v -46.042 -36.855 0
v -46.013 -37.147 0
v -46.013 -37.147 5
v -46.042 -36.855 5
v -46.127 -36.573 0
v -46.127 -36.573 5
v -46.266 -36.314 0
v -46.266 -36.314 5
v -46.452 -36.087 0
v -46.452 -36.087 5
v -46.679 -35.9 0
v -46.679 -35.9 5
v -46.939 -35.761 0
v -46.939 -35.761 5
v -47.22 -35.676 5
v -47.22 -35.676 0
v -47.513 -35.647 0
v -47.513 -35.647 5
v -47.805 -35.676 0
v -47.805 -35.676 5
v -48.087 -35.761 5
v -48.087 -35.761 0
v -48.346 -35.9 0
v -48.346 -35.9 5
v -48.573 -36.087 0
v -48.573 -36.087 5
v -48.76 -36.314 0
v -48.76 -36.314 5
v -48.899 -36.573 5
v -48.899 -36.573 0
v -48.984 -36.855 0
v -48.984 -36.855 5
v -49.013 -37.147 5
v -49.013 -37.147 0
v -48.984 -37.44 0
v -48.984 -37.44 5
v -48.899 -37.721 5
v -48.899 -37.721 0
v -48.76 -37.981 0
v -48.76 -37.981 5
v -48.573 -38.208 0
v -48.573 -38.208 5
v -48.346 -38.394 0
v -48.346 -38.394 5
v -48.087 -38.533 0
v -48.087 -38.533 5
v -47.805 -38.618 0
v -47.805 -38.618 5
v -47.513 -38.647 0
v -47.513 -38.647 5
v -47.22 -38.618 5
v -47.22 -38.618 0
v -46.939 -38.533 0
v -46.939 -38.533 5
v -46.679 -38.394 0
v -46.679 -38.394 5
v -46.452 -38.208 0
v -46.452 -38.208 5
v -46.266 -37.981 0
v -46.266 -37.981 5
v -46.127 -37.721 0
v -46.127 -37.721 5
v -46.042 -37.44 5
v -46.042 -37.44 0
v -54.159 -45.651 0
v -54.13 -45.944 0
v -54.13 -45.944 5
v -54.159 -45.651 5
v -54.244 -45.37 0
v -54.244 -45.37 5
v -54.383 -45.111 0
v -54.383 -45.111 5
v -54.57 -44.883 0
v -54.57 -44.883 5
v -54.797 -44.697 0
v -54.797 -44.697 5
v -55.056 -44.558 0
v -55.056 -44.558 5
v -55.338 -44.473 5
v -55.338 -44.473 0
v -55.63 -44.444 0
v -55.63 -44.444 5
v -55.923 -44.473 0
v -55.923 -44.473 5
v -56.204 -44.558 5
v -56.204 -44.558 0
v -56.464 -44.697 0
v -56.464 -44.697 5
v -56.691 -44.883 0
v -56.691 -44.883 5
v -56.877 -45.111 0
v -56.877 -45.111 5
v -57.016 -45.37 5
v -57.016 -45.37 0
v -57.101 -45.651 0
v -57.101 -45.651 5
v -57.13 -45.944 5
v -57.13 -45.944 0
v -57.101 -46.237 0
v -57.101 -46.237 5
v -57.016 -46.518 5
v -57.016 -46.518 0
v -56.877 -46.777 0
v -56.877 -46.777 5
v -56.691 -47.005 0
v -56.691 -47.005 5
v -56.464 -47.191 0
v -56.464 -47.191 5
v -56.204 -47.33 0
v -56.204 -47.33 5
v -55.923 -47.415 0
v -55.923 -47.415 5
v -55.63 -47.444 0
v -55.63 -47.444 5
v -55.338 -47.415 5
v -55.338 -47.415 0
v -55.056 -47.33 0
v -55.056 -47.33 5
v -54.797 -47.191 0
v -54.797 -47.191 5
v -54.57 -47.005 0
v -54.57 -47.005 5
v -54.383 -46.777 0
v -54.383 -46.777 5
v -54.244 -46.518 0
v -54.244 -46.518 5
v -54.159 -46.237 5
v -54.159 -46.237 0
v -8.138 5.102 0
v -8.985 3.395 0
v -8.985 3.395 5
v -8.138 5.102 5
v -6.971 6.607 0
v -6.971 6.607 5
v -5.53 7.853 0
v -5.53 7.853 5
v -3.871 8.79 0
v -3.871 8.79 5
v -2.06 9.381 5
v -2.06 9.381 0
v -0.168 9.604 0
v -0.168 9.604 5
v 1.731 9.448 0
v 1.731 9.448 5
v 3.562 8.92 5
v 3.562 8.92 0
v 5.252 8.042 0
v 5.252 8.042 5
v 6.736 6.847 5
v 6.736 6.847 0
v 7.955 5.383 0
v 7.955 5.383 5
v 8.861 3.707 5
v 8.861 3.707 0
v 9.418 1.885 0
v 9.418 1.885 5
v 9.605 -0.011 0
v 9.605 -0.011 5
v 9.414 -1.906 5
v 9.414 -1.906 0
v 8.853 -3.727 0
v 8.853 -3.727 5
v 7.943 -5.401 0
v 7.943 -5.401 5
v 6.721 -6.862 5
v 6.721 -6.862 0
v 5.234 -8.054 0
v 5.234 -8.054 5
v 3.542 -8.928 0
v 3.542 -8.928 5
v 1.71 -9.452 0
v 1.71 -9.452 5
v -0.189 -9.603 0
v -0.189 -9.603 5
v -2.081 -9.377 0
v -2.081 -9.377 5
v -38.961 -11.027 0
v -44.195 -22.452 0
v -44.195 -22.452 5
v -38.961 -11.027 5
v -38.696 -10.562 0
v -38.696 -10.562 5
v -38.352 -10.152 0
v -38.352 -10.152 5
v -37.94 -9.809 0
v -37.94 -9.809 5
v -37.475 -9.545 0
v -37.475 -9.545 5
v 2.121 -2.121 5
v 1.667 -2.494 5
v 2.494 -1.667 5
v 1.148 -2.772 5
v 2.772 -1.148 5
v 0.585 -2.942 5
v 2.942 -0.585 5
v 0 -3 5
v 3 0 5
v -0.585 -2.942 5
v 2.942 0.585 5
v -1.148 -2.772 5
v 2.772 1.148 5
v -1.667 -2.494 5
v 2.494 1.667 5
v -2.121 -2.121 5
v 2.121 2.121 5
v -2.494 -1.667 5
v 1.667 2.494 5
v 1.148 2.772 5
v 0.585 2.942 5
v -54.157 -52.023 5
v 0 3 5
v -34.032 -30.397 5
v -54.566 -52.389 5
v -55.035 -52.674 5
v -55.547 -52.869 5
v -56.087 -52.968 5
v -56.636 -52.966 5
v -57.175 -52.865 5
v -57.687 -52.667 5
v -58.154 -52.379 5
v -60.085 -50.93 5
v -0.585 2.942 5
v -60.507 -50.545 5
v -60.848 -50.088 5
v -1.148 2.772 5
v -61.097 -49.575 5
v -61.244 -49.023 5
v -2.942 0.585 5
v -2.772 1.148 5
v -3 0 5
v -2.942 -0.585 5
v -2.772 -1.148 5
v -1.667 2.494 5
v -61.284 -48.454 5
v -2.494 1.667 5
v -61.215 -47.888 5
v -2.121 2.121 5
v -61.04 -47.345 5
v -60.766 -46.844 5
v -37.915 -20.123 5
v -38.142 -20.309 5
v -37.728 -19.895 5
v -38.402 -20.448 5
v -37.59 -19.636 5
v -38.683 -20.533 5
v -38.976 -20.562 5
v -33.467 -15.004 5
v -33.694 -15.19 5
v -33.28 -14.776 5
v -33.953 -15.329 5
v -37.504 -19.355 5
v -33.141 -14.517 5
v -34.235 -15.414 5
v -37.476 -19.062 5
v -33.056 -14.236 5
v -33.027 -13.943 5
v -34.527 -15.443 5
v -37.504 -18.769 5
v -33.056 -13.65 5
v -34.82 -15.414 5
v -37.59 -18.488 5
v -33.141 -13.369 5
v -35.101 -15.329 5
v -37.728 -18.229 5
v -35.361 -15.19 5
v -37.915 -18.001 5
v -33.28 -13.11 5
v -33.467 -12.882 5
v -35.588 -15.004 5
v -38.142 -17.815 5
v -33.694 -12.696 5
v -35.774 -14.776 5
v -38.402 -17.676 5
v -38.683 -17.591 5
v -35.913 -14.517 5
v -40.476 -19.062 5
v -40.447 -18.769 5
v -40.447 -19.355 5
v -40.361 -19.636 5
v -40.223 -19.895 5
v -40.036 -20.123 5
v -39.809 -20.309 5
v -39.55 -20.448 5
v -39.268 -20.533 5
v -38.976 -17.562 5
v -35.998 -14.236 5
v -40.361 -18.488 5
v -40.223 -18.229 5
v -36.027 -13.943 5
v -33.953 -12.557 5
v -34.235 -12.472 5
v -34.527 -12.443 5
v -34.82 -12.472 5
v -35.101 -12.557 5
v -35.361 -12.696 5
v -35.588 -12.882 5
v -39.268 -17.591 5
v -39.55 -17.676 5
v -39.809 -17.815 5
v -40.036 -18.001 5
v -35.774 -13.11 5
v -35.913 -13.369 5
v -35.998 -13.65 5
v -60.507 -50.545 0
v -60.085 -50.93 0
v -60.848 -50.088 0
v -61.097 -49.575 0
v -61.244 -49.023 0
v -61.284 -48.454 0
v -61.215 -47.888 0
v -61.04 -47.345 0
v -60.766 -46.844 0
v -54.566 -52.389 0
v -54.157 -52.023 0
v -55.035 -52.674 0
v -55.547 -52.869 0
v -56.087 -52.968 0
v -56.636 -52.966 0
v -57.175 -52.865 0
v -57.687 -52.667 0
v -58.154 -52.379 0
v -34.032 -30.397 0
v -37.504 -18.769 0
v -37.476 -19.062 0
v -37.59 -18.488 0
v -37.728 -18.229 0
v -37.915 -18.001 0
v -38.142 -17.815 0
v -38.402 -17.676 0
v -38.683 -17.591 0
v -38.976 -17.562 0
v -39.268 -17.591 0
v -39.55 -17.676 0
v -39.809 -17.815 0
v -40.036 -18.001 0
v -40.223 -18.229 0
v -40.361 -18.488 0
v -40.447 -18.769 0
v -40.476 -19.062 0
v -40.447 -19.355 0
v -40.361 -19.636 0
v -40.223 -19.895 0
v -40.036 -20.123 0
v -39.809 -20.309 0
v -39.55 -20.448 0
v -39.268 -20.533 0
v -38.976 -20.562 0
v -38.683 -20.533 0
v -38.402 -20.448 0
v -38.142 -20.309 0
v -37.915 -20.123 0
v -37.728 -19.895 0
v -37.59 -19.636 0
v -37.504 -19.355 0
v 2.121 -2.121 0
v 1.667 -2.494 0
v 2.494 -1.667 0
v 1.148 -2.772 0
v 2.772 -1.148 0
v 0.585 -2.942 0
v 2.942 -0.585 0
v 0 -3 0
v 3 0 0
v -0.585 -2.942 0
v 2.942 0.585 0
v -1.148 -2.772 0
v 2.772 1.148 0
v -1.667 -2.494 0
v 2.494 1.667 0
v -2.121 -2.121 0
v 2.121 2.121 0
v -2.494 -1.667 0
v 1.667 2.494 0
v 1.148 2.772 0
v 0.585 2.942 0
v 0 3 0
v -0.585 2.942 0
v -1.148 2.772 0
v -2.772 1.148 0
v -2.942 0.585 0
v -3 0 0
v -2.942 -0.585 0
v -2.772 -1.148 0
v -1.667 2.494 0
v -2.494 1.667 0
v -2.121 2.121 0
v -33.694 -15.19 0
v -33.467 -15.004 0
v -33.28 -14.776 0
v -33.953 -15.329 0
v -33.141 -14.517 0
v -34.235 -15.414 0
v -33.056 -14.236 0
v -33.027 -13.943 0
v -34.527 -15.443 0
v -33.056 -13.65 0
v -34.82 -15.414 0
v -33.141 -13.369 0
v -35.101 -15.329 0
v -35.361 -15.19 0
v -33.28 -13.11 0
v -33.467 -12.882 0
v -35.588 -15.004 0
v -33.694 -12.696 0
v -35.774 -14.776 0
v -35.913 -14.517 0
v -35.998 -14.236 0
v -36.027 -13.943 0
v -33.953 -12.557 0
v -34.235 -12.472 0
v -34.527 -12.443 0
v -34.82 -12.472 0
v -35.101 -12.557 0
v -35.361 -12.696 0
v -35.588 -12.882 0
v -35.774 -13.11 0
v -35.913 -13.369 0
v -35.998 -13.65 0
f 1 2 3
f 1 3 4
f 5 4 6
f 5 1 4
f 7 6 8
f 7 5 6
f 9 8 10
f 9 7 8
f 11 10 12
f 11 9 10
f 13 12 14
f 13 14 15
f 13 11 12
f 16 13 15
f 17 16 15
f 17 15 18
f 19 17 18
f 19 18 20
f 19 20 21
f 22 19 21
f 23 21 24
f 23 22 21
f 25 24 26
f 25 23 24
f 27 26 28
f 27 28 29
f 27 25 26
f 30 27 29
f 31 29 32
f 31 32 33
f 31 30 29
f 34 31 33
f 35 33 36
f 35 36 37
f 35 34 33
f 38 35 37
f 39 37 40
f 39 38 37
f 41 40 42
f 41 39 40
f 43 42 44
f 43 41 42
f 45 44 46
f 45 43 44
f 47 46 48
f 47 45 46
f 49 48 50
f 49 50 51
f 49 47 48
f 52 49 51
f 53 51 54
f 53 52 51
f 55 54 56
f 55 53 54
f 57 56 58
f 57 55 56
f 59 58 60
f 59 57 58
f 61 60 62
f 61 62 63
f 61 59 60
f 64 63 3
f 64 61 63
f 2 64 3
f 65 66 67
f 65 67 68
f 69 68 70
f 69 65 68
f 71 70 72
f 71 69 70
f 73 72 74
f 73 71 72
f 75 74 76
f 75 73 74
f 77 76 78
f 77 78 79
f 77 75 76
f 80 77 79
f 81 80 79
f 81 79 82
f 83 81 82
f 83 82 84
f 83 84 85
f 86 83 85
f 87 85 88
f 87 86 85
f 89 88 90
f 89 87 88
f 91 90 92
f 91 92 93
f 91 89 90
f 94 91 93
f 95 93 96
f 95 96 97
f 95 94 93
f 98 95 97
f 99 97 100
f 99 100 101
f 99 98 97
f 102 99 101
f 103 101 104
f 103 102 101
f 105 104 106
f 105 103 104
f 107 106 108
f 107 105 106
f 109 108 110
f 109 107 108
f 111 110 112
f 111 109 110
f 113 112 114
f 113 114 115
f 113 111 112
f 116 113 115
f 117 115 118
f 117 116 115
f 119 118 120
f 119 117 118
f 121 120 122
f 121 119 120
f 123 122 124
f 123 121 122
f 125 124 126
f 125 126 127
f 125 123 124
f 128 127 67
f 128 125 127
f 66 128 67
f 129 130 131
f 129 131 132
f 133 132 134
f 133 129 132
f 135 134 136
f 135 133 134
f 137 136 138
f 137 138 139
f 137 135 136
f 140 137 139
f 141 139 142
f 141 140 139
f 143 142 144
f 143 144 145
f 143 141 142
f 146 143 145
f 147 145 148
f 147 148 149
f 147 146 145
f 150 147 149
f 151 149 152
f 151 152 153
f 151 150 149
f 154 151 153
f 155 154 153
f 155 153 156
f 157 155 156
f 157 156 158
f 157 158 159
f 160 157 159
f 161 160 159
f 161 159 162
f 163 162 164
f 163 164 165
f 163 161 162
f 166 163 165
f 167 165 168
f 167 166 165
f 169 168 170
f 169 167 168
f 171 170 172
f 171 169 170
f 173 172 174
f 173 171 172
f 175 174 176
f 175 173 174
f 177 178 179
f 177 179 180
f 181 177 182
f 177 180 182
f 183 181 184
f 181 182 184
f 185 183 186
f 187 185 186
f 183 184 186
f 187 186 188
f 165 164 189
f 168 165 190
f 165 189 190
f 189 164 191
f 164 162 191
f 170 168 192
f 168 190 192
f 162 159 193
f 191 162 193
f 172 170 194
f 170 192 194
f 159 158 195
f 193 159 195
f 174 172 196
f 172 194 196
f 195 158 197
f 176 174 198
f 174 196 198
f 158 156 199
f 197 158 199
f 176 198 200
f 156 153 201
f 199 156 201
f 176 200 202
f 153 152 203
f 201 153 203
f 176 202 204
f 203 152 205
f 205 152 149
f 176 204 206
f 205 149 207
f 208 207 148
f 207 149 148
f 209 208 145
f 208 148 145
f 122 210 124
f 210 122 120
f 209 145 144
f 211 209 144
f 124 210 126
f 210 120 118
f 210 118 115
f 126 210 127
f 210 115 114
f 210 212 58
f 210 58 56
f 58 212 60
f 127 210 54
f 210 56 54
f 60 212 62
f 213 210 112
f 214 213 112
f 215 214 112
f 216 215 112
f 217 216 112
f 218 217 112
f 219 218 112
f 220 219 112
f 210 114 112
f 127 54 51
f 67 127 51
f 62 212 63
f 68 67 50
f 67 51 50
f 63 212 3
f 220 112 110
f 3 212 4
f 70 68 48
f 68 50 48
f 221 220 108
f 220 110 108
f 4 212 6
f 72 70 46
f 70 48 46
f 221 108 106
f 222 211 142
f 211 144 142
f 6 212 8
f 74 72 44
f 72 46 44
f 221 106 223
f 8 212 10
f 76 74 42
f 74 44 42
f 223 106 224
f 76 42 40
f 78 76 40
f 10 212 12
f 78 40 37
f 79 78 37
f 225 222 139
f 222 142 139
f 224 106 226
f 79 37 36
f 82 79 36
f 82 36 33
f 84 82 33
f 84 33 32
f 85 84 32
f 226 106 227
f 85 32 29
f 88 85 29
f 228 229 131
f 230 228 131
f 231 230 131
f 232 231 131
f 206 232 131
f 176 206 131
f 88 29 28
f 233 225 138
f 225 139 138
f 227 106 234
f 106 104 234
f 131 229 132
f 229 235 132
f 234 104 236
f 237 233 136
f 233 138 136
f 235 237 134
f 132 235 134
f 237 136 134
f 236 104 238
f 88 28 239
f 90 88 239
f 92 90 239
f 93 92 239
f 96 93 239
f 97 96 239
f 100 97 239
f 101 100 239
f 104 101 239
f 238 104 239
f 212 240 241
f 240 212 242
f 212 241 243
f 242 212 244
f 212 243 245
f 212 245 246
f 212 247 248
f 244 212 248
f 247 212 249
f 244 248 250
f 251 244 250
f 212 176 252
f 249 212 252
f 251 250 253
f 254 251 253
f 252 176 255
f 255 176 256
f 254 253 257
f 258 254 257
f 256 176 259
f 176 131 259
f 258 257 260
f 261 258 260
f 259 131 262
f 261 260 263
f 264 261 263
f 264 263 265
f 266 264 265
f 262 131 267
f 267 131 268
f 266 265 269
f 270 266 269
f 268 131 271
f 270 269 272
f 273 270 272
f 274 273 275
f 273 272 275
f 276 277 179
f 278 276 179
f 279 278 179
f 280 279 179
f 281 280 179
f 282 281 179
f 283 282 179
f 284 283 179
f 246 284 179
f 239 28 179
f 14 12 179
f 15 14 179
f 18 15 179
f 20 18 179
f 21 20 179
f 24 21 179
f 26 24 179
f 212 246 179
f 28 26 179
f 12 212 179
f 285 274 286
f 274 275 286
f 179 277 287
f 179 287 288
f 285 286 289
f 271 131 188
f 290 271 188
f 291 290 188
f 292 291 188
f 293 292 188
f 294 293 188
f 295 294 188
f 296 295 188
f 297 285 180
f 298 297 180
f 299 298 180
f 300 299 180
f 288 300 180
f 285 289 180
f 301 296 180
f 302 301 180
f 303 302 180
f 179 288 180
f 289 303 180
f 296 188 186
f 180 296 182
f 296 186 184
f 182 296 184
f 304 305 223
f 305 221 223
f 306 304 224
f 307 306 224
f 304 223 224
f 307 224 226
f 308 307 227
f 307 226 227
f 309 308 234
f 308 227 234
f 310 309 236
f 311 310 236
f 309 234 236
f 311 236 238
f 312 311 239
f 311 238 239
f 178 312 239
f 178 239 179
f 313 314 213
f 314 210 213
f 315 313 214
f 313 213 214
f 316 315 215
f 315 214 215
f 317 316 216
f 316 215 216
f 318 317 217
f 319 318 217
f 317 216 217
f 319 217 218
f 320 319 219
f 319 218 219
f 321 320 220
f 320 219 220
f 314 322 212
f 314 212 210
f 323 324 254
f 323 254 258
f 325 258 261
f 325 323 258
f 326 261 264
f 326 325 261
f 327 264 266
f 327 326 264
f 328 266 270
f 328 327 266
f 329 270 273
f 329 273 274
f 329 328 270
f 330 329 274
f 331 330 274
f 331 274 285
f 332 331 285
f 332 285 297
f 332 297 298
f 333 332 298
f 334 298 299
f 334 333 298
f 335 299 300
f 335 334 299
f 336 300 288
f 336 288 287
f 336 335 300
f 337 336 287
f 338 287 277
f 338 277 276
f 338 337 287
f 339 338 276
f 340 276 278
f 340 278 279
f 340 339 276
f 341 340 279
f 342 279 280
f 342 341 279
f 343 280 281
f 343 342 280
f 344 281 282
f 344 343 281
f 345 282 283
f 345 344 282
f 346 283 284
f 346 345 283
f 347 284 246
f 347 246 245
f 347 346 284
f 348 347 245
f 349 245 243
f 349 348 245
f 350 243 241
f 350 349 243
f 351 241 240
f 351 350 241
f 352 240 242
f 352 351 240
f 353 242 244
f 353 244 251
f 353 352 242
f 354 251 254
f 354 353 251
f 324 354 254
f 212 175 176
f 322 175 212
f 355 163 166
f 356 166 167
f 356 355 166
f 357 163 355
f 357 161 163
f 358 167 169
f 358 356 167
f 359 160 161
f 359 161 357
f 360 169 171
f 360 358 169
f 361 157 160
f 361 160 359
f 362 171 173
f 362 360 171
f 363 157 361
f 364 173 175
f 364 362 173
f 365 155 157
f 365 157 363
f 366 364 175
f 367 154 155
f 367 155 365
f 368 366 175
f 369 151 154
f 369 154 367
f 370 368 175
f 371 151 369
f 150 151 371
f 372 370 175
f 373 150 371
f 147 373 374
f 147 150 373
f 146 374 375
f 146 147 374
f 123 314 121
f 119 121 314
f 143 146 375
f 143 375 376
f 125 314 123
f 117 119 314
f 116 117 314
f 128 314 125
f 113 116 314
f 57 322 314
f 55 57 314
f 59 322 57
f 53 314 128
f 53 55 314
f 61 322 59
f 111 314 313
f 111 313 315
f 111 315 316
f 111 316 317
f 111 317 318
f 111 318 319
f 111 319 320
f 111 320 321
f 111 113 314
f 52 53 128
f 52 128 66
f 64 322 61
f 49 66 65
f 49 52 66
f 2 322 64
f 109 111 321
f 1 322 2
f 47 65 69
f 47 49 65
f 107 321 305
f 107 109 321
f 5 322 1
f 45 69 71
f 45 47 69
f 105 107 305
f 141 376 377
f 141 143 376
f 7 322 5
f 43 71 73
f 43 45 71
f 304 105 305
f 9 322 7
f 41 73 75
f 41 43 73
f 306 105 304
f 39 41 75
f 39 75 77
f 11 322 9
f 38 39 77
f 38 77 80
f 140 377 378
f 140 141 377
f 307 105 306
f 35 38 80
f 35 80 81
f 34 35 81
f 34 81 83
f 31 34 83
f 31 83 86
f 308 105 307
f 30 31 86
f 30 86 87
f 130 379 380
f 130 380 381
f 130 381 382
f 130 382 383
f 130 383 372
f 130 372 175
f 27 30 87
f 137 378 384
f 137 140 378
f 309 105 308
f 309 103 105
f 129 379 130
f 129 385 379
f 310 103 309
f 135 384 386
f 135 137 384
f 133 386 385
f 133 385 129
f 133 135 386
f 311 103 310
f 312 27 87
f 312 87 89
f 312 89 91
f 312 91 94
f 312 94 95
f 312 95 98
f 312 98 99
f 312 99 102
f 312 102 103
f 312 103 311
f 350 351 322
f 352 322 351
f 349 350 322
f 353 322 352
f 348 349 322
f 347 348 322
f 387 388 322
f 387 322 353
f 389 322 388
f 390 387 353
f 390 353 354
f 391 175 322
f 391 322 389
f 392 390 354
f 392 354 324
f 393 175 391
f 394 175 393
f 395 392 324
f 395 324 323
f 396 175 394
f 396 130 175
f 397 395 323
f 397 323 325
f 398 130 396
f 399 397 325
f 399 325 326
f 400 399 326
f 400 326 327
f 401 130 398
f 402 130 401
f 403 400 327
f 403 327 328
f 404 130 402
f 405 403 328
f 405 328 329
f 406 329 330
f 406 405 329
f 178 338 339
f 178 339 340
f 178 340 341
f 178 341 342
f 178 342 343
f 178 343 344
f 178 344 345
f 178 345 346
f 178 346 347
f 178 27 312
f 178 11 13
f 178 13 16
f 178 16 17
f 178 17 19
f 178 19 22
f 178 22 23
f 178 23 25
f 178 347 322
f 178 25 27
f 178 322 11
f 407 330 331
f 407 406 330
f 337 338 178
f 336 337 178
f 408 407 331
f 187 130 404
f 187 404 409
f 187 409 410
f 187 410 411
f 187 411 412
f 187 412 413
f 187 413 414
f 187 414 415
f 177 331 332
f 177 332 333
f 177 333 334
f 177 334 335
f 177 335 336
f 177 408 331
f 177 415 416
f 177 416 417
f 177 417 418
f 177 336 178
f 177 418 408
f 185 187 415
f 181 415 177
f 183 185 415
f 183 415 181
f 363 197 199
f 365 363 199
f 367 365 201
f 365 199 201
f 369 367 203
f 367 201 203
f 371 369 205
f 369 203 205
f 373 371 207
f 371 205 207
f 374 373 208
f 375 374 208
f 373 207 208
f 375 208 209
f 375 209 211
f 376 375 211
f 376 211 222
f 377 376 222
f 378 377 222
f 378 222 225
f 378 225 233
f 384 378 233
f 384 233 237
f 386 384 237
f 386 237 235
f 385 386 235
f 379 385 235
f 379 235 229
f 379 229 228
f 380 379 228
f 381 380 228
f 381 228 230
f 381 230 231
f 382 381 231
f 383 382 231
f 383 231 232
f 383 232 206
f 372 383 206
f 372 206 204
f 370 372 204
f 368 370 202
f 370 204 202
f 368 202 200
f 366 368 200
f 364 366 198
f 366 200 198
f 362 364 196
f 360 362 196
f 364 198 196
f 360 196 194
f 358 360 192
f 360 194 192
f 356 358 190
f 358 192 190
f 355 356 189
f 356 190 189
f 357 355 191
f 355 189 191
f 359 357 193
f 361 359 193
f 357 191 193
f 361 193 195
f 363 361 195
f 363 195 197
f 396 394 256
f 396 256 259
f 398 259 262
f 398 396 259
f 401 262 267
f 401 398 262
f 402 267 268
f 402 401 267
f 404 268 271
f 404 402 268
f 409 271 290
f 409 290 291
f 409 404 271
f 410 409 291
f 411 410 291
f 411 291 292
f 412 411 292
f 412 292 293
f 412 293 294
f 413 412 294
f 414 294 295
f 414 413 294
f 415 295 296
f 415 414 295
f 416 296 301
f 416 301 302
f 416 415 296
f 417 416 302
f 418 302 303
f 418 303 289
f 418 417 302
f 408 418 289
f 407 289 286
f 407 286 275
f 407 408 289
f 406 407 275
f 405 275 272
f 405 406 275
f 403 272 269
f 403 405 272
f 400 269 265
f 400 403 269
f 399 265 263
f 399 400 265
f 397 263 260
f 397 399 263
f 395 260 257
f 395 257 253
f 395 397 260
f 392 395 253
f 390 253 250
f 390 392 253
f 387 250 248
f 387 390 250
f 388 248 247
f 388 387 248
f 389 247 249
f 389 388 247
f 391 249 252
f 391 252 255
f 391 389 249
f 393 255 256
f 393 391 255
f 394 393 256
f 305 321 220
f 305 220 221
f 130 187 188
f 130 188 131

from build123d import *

# Parameters (mm, degrees)
SKETCH_1_R          = 1.5
EXTRUDE_1_DEPTH     = 5
FILLET_1_R          = 3
FILLET_2_R          = 3
FILLET_3_R          = 3
SKETCH_4_R          = 3
CUT_EXTRUDE_1_DEPTH = 82.164250349


with BuildPart() as part:
    # 草图1 → 凸台-拉伸1 (new body)
    with BuildSketch(Plane.XY):
        with BuildLine():
            Line((-2.080891717, -9.376881926), (-34.032481316, -30.39709937))
            Line((-34.032481316, -30.39709937), (-55.995404685, -53.998955167))
            Line((-55.995404685, -53.998955167), (-62.374359774, -49.211848164))
            Line((-62.374359774, -49.211848164), (-44.195107683, -22.4521745))
            Line((-44.195107683, -22.4521745), (-38.494818087, -10.008396594))
            Line((-38.494818087, -10.008396594), (-8.984967737, 3.395052247))
            ThreePointArc((-8.984967737, 3.395052247), (8.44949034, 4.567508949), (-2.080891717, -9.376881926))
        make_face()
        with Locations((-38.975543913, -19.061918057)):
            Circle(SKETCH_1_R, mode=Mode.SUBTRACT)
        with Locations((-34.52729214, -13.94289816)):
            Circle(SKETCH_1_R, mode=Mode.SUBTRACT)
        with Locations((-47.512706739, -37.147272562)):
            Circle(SKETCH_1_R, mode=Mode.SUBTRACT)
        with Locations((-55.63024758, -45.943962561)):
            Circle(SKETCH_1_R, mode=Mode.SUBTRACT)
    extrude(amount=EXTRUDE_1_DEPTH)

    # 圆角1
    fillet_1_edges = [part.edges().sort_by_distance(p)[0] for p in [
        (-55.995404685, -53.998955167, 2.5),
    ]]
    fillet(fillet_1_edges, radius=FILLET_1_R)

    # 圆角2
    fillet_2_edges = [part.edges().sort_by_distance(p)[0] for p in [
        (-62.374359774, -49.211848164, 2.5),
    ]]
    fillet(fillet_2_edges, radius=FILLET_2_R)

    # 圆角3
    fillet_3_edges = [part.edges().sort_by_distance(p)[0] for p in [
        (-38.494818087, -10.008396594, 2.5),
    ]]
    fillet(fillet_3_edges, radius=FILLET_3_R)

    # 草图4 → 切除-拉伸1 (cut, through all)
    with BuildSketch(Plane.XY.offset(5)):
        Circle(SKETCH_4_R)
    extrude(amount=-CUT_EXTRUDE_1_DEPTH, mode=Mode.SUBTRACT)


solid = part.part
